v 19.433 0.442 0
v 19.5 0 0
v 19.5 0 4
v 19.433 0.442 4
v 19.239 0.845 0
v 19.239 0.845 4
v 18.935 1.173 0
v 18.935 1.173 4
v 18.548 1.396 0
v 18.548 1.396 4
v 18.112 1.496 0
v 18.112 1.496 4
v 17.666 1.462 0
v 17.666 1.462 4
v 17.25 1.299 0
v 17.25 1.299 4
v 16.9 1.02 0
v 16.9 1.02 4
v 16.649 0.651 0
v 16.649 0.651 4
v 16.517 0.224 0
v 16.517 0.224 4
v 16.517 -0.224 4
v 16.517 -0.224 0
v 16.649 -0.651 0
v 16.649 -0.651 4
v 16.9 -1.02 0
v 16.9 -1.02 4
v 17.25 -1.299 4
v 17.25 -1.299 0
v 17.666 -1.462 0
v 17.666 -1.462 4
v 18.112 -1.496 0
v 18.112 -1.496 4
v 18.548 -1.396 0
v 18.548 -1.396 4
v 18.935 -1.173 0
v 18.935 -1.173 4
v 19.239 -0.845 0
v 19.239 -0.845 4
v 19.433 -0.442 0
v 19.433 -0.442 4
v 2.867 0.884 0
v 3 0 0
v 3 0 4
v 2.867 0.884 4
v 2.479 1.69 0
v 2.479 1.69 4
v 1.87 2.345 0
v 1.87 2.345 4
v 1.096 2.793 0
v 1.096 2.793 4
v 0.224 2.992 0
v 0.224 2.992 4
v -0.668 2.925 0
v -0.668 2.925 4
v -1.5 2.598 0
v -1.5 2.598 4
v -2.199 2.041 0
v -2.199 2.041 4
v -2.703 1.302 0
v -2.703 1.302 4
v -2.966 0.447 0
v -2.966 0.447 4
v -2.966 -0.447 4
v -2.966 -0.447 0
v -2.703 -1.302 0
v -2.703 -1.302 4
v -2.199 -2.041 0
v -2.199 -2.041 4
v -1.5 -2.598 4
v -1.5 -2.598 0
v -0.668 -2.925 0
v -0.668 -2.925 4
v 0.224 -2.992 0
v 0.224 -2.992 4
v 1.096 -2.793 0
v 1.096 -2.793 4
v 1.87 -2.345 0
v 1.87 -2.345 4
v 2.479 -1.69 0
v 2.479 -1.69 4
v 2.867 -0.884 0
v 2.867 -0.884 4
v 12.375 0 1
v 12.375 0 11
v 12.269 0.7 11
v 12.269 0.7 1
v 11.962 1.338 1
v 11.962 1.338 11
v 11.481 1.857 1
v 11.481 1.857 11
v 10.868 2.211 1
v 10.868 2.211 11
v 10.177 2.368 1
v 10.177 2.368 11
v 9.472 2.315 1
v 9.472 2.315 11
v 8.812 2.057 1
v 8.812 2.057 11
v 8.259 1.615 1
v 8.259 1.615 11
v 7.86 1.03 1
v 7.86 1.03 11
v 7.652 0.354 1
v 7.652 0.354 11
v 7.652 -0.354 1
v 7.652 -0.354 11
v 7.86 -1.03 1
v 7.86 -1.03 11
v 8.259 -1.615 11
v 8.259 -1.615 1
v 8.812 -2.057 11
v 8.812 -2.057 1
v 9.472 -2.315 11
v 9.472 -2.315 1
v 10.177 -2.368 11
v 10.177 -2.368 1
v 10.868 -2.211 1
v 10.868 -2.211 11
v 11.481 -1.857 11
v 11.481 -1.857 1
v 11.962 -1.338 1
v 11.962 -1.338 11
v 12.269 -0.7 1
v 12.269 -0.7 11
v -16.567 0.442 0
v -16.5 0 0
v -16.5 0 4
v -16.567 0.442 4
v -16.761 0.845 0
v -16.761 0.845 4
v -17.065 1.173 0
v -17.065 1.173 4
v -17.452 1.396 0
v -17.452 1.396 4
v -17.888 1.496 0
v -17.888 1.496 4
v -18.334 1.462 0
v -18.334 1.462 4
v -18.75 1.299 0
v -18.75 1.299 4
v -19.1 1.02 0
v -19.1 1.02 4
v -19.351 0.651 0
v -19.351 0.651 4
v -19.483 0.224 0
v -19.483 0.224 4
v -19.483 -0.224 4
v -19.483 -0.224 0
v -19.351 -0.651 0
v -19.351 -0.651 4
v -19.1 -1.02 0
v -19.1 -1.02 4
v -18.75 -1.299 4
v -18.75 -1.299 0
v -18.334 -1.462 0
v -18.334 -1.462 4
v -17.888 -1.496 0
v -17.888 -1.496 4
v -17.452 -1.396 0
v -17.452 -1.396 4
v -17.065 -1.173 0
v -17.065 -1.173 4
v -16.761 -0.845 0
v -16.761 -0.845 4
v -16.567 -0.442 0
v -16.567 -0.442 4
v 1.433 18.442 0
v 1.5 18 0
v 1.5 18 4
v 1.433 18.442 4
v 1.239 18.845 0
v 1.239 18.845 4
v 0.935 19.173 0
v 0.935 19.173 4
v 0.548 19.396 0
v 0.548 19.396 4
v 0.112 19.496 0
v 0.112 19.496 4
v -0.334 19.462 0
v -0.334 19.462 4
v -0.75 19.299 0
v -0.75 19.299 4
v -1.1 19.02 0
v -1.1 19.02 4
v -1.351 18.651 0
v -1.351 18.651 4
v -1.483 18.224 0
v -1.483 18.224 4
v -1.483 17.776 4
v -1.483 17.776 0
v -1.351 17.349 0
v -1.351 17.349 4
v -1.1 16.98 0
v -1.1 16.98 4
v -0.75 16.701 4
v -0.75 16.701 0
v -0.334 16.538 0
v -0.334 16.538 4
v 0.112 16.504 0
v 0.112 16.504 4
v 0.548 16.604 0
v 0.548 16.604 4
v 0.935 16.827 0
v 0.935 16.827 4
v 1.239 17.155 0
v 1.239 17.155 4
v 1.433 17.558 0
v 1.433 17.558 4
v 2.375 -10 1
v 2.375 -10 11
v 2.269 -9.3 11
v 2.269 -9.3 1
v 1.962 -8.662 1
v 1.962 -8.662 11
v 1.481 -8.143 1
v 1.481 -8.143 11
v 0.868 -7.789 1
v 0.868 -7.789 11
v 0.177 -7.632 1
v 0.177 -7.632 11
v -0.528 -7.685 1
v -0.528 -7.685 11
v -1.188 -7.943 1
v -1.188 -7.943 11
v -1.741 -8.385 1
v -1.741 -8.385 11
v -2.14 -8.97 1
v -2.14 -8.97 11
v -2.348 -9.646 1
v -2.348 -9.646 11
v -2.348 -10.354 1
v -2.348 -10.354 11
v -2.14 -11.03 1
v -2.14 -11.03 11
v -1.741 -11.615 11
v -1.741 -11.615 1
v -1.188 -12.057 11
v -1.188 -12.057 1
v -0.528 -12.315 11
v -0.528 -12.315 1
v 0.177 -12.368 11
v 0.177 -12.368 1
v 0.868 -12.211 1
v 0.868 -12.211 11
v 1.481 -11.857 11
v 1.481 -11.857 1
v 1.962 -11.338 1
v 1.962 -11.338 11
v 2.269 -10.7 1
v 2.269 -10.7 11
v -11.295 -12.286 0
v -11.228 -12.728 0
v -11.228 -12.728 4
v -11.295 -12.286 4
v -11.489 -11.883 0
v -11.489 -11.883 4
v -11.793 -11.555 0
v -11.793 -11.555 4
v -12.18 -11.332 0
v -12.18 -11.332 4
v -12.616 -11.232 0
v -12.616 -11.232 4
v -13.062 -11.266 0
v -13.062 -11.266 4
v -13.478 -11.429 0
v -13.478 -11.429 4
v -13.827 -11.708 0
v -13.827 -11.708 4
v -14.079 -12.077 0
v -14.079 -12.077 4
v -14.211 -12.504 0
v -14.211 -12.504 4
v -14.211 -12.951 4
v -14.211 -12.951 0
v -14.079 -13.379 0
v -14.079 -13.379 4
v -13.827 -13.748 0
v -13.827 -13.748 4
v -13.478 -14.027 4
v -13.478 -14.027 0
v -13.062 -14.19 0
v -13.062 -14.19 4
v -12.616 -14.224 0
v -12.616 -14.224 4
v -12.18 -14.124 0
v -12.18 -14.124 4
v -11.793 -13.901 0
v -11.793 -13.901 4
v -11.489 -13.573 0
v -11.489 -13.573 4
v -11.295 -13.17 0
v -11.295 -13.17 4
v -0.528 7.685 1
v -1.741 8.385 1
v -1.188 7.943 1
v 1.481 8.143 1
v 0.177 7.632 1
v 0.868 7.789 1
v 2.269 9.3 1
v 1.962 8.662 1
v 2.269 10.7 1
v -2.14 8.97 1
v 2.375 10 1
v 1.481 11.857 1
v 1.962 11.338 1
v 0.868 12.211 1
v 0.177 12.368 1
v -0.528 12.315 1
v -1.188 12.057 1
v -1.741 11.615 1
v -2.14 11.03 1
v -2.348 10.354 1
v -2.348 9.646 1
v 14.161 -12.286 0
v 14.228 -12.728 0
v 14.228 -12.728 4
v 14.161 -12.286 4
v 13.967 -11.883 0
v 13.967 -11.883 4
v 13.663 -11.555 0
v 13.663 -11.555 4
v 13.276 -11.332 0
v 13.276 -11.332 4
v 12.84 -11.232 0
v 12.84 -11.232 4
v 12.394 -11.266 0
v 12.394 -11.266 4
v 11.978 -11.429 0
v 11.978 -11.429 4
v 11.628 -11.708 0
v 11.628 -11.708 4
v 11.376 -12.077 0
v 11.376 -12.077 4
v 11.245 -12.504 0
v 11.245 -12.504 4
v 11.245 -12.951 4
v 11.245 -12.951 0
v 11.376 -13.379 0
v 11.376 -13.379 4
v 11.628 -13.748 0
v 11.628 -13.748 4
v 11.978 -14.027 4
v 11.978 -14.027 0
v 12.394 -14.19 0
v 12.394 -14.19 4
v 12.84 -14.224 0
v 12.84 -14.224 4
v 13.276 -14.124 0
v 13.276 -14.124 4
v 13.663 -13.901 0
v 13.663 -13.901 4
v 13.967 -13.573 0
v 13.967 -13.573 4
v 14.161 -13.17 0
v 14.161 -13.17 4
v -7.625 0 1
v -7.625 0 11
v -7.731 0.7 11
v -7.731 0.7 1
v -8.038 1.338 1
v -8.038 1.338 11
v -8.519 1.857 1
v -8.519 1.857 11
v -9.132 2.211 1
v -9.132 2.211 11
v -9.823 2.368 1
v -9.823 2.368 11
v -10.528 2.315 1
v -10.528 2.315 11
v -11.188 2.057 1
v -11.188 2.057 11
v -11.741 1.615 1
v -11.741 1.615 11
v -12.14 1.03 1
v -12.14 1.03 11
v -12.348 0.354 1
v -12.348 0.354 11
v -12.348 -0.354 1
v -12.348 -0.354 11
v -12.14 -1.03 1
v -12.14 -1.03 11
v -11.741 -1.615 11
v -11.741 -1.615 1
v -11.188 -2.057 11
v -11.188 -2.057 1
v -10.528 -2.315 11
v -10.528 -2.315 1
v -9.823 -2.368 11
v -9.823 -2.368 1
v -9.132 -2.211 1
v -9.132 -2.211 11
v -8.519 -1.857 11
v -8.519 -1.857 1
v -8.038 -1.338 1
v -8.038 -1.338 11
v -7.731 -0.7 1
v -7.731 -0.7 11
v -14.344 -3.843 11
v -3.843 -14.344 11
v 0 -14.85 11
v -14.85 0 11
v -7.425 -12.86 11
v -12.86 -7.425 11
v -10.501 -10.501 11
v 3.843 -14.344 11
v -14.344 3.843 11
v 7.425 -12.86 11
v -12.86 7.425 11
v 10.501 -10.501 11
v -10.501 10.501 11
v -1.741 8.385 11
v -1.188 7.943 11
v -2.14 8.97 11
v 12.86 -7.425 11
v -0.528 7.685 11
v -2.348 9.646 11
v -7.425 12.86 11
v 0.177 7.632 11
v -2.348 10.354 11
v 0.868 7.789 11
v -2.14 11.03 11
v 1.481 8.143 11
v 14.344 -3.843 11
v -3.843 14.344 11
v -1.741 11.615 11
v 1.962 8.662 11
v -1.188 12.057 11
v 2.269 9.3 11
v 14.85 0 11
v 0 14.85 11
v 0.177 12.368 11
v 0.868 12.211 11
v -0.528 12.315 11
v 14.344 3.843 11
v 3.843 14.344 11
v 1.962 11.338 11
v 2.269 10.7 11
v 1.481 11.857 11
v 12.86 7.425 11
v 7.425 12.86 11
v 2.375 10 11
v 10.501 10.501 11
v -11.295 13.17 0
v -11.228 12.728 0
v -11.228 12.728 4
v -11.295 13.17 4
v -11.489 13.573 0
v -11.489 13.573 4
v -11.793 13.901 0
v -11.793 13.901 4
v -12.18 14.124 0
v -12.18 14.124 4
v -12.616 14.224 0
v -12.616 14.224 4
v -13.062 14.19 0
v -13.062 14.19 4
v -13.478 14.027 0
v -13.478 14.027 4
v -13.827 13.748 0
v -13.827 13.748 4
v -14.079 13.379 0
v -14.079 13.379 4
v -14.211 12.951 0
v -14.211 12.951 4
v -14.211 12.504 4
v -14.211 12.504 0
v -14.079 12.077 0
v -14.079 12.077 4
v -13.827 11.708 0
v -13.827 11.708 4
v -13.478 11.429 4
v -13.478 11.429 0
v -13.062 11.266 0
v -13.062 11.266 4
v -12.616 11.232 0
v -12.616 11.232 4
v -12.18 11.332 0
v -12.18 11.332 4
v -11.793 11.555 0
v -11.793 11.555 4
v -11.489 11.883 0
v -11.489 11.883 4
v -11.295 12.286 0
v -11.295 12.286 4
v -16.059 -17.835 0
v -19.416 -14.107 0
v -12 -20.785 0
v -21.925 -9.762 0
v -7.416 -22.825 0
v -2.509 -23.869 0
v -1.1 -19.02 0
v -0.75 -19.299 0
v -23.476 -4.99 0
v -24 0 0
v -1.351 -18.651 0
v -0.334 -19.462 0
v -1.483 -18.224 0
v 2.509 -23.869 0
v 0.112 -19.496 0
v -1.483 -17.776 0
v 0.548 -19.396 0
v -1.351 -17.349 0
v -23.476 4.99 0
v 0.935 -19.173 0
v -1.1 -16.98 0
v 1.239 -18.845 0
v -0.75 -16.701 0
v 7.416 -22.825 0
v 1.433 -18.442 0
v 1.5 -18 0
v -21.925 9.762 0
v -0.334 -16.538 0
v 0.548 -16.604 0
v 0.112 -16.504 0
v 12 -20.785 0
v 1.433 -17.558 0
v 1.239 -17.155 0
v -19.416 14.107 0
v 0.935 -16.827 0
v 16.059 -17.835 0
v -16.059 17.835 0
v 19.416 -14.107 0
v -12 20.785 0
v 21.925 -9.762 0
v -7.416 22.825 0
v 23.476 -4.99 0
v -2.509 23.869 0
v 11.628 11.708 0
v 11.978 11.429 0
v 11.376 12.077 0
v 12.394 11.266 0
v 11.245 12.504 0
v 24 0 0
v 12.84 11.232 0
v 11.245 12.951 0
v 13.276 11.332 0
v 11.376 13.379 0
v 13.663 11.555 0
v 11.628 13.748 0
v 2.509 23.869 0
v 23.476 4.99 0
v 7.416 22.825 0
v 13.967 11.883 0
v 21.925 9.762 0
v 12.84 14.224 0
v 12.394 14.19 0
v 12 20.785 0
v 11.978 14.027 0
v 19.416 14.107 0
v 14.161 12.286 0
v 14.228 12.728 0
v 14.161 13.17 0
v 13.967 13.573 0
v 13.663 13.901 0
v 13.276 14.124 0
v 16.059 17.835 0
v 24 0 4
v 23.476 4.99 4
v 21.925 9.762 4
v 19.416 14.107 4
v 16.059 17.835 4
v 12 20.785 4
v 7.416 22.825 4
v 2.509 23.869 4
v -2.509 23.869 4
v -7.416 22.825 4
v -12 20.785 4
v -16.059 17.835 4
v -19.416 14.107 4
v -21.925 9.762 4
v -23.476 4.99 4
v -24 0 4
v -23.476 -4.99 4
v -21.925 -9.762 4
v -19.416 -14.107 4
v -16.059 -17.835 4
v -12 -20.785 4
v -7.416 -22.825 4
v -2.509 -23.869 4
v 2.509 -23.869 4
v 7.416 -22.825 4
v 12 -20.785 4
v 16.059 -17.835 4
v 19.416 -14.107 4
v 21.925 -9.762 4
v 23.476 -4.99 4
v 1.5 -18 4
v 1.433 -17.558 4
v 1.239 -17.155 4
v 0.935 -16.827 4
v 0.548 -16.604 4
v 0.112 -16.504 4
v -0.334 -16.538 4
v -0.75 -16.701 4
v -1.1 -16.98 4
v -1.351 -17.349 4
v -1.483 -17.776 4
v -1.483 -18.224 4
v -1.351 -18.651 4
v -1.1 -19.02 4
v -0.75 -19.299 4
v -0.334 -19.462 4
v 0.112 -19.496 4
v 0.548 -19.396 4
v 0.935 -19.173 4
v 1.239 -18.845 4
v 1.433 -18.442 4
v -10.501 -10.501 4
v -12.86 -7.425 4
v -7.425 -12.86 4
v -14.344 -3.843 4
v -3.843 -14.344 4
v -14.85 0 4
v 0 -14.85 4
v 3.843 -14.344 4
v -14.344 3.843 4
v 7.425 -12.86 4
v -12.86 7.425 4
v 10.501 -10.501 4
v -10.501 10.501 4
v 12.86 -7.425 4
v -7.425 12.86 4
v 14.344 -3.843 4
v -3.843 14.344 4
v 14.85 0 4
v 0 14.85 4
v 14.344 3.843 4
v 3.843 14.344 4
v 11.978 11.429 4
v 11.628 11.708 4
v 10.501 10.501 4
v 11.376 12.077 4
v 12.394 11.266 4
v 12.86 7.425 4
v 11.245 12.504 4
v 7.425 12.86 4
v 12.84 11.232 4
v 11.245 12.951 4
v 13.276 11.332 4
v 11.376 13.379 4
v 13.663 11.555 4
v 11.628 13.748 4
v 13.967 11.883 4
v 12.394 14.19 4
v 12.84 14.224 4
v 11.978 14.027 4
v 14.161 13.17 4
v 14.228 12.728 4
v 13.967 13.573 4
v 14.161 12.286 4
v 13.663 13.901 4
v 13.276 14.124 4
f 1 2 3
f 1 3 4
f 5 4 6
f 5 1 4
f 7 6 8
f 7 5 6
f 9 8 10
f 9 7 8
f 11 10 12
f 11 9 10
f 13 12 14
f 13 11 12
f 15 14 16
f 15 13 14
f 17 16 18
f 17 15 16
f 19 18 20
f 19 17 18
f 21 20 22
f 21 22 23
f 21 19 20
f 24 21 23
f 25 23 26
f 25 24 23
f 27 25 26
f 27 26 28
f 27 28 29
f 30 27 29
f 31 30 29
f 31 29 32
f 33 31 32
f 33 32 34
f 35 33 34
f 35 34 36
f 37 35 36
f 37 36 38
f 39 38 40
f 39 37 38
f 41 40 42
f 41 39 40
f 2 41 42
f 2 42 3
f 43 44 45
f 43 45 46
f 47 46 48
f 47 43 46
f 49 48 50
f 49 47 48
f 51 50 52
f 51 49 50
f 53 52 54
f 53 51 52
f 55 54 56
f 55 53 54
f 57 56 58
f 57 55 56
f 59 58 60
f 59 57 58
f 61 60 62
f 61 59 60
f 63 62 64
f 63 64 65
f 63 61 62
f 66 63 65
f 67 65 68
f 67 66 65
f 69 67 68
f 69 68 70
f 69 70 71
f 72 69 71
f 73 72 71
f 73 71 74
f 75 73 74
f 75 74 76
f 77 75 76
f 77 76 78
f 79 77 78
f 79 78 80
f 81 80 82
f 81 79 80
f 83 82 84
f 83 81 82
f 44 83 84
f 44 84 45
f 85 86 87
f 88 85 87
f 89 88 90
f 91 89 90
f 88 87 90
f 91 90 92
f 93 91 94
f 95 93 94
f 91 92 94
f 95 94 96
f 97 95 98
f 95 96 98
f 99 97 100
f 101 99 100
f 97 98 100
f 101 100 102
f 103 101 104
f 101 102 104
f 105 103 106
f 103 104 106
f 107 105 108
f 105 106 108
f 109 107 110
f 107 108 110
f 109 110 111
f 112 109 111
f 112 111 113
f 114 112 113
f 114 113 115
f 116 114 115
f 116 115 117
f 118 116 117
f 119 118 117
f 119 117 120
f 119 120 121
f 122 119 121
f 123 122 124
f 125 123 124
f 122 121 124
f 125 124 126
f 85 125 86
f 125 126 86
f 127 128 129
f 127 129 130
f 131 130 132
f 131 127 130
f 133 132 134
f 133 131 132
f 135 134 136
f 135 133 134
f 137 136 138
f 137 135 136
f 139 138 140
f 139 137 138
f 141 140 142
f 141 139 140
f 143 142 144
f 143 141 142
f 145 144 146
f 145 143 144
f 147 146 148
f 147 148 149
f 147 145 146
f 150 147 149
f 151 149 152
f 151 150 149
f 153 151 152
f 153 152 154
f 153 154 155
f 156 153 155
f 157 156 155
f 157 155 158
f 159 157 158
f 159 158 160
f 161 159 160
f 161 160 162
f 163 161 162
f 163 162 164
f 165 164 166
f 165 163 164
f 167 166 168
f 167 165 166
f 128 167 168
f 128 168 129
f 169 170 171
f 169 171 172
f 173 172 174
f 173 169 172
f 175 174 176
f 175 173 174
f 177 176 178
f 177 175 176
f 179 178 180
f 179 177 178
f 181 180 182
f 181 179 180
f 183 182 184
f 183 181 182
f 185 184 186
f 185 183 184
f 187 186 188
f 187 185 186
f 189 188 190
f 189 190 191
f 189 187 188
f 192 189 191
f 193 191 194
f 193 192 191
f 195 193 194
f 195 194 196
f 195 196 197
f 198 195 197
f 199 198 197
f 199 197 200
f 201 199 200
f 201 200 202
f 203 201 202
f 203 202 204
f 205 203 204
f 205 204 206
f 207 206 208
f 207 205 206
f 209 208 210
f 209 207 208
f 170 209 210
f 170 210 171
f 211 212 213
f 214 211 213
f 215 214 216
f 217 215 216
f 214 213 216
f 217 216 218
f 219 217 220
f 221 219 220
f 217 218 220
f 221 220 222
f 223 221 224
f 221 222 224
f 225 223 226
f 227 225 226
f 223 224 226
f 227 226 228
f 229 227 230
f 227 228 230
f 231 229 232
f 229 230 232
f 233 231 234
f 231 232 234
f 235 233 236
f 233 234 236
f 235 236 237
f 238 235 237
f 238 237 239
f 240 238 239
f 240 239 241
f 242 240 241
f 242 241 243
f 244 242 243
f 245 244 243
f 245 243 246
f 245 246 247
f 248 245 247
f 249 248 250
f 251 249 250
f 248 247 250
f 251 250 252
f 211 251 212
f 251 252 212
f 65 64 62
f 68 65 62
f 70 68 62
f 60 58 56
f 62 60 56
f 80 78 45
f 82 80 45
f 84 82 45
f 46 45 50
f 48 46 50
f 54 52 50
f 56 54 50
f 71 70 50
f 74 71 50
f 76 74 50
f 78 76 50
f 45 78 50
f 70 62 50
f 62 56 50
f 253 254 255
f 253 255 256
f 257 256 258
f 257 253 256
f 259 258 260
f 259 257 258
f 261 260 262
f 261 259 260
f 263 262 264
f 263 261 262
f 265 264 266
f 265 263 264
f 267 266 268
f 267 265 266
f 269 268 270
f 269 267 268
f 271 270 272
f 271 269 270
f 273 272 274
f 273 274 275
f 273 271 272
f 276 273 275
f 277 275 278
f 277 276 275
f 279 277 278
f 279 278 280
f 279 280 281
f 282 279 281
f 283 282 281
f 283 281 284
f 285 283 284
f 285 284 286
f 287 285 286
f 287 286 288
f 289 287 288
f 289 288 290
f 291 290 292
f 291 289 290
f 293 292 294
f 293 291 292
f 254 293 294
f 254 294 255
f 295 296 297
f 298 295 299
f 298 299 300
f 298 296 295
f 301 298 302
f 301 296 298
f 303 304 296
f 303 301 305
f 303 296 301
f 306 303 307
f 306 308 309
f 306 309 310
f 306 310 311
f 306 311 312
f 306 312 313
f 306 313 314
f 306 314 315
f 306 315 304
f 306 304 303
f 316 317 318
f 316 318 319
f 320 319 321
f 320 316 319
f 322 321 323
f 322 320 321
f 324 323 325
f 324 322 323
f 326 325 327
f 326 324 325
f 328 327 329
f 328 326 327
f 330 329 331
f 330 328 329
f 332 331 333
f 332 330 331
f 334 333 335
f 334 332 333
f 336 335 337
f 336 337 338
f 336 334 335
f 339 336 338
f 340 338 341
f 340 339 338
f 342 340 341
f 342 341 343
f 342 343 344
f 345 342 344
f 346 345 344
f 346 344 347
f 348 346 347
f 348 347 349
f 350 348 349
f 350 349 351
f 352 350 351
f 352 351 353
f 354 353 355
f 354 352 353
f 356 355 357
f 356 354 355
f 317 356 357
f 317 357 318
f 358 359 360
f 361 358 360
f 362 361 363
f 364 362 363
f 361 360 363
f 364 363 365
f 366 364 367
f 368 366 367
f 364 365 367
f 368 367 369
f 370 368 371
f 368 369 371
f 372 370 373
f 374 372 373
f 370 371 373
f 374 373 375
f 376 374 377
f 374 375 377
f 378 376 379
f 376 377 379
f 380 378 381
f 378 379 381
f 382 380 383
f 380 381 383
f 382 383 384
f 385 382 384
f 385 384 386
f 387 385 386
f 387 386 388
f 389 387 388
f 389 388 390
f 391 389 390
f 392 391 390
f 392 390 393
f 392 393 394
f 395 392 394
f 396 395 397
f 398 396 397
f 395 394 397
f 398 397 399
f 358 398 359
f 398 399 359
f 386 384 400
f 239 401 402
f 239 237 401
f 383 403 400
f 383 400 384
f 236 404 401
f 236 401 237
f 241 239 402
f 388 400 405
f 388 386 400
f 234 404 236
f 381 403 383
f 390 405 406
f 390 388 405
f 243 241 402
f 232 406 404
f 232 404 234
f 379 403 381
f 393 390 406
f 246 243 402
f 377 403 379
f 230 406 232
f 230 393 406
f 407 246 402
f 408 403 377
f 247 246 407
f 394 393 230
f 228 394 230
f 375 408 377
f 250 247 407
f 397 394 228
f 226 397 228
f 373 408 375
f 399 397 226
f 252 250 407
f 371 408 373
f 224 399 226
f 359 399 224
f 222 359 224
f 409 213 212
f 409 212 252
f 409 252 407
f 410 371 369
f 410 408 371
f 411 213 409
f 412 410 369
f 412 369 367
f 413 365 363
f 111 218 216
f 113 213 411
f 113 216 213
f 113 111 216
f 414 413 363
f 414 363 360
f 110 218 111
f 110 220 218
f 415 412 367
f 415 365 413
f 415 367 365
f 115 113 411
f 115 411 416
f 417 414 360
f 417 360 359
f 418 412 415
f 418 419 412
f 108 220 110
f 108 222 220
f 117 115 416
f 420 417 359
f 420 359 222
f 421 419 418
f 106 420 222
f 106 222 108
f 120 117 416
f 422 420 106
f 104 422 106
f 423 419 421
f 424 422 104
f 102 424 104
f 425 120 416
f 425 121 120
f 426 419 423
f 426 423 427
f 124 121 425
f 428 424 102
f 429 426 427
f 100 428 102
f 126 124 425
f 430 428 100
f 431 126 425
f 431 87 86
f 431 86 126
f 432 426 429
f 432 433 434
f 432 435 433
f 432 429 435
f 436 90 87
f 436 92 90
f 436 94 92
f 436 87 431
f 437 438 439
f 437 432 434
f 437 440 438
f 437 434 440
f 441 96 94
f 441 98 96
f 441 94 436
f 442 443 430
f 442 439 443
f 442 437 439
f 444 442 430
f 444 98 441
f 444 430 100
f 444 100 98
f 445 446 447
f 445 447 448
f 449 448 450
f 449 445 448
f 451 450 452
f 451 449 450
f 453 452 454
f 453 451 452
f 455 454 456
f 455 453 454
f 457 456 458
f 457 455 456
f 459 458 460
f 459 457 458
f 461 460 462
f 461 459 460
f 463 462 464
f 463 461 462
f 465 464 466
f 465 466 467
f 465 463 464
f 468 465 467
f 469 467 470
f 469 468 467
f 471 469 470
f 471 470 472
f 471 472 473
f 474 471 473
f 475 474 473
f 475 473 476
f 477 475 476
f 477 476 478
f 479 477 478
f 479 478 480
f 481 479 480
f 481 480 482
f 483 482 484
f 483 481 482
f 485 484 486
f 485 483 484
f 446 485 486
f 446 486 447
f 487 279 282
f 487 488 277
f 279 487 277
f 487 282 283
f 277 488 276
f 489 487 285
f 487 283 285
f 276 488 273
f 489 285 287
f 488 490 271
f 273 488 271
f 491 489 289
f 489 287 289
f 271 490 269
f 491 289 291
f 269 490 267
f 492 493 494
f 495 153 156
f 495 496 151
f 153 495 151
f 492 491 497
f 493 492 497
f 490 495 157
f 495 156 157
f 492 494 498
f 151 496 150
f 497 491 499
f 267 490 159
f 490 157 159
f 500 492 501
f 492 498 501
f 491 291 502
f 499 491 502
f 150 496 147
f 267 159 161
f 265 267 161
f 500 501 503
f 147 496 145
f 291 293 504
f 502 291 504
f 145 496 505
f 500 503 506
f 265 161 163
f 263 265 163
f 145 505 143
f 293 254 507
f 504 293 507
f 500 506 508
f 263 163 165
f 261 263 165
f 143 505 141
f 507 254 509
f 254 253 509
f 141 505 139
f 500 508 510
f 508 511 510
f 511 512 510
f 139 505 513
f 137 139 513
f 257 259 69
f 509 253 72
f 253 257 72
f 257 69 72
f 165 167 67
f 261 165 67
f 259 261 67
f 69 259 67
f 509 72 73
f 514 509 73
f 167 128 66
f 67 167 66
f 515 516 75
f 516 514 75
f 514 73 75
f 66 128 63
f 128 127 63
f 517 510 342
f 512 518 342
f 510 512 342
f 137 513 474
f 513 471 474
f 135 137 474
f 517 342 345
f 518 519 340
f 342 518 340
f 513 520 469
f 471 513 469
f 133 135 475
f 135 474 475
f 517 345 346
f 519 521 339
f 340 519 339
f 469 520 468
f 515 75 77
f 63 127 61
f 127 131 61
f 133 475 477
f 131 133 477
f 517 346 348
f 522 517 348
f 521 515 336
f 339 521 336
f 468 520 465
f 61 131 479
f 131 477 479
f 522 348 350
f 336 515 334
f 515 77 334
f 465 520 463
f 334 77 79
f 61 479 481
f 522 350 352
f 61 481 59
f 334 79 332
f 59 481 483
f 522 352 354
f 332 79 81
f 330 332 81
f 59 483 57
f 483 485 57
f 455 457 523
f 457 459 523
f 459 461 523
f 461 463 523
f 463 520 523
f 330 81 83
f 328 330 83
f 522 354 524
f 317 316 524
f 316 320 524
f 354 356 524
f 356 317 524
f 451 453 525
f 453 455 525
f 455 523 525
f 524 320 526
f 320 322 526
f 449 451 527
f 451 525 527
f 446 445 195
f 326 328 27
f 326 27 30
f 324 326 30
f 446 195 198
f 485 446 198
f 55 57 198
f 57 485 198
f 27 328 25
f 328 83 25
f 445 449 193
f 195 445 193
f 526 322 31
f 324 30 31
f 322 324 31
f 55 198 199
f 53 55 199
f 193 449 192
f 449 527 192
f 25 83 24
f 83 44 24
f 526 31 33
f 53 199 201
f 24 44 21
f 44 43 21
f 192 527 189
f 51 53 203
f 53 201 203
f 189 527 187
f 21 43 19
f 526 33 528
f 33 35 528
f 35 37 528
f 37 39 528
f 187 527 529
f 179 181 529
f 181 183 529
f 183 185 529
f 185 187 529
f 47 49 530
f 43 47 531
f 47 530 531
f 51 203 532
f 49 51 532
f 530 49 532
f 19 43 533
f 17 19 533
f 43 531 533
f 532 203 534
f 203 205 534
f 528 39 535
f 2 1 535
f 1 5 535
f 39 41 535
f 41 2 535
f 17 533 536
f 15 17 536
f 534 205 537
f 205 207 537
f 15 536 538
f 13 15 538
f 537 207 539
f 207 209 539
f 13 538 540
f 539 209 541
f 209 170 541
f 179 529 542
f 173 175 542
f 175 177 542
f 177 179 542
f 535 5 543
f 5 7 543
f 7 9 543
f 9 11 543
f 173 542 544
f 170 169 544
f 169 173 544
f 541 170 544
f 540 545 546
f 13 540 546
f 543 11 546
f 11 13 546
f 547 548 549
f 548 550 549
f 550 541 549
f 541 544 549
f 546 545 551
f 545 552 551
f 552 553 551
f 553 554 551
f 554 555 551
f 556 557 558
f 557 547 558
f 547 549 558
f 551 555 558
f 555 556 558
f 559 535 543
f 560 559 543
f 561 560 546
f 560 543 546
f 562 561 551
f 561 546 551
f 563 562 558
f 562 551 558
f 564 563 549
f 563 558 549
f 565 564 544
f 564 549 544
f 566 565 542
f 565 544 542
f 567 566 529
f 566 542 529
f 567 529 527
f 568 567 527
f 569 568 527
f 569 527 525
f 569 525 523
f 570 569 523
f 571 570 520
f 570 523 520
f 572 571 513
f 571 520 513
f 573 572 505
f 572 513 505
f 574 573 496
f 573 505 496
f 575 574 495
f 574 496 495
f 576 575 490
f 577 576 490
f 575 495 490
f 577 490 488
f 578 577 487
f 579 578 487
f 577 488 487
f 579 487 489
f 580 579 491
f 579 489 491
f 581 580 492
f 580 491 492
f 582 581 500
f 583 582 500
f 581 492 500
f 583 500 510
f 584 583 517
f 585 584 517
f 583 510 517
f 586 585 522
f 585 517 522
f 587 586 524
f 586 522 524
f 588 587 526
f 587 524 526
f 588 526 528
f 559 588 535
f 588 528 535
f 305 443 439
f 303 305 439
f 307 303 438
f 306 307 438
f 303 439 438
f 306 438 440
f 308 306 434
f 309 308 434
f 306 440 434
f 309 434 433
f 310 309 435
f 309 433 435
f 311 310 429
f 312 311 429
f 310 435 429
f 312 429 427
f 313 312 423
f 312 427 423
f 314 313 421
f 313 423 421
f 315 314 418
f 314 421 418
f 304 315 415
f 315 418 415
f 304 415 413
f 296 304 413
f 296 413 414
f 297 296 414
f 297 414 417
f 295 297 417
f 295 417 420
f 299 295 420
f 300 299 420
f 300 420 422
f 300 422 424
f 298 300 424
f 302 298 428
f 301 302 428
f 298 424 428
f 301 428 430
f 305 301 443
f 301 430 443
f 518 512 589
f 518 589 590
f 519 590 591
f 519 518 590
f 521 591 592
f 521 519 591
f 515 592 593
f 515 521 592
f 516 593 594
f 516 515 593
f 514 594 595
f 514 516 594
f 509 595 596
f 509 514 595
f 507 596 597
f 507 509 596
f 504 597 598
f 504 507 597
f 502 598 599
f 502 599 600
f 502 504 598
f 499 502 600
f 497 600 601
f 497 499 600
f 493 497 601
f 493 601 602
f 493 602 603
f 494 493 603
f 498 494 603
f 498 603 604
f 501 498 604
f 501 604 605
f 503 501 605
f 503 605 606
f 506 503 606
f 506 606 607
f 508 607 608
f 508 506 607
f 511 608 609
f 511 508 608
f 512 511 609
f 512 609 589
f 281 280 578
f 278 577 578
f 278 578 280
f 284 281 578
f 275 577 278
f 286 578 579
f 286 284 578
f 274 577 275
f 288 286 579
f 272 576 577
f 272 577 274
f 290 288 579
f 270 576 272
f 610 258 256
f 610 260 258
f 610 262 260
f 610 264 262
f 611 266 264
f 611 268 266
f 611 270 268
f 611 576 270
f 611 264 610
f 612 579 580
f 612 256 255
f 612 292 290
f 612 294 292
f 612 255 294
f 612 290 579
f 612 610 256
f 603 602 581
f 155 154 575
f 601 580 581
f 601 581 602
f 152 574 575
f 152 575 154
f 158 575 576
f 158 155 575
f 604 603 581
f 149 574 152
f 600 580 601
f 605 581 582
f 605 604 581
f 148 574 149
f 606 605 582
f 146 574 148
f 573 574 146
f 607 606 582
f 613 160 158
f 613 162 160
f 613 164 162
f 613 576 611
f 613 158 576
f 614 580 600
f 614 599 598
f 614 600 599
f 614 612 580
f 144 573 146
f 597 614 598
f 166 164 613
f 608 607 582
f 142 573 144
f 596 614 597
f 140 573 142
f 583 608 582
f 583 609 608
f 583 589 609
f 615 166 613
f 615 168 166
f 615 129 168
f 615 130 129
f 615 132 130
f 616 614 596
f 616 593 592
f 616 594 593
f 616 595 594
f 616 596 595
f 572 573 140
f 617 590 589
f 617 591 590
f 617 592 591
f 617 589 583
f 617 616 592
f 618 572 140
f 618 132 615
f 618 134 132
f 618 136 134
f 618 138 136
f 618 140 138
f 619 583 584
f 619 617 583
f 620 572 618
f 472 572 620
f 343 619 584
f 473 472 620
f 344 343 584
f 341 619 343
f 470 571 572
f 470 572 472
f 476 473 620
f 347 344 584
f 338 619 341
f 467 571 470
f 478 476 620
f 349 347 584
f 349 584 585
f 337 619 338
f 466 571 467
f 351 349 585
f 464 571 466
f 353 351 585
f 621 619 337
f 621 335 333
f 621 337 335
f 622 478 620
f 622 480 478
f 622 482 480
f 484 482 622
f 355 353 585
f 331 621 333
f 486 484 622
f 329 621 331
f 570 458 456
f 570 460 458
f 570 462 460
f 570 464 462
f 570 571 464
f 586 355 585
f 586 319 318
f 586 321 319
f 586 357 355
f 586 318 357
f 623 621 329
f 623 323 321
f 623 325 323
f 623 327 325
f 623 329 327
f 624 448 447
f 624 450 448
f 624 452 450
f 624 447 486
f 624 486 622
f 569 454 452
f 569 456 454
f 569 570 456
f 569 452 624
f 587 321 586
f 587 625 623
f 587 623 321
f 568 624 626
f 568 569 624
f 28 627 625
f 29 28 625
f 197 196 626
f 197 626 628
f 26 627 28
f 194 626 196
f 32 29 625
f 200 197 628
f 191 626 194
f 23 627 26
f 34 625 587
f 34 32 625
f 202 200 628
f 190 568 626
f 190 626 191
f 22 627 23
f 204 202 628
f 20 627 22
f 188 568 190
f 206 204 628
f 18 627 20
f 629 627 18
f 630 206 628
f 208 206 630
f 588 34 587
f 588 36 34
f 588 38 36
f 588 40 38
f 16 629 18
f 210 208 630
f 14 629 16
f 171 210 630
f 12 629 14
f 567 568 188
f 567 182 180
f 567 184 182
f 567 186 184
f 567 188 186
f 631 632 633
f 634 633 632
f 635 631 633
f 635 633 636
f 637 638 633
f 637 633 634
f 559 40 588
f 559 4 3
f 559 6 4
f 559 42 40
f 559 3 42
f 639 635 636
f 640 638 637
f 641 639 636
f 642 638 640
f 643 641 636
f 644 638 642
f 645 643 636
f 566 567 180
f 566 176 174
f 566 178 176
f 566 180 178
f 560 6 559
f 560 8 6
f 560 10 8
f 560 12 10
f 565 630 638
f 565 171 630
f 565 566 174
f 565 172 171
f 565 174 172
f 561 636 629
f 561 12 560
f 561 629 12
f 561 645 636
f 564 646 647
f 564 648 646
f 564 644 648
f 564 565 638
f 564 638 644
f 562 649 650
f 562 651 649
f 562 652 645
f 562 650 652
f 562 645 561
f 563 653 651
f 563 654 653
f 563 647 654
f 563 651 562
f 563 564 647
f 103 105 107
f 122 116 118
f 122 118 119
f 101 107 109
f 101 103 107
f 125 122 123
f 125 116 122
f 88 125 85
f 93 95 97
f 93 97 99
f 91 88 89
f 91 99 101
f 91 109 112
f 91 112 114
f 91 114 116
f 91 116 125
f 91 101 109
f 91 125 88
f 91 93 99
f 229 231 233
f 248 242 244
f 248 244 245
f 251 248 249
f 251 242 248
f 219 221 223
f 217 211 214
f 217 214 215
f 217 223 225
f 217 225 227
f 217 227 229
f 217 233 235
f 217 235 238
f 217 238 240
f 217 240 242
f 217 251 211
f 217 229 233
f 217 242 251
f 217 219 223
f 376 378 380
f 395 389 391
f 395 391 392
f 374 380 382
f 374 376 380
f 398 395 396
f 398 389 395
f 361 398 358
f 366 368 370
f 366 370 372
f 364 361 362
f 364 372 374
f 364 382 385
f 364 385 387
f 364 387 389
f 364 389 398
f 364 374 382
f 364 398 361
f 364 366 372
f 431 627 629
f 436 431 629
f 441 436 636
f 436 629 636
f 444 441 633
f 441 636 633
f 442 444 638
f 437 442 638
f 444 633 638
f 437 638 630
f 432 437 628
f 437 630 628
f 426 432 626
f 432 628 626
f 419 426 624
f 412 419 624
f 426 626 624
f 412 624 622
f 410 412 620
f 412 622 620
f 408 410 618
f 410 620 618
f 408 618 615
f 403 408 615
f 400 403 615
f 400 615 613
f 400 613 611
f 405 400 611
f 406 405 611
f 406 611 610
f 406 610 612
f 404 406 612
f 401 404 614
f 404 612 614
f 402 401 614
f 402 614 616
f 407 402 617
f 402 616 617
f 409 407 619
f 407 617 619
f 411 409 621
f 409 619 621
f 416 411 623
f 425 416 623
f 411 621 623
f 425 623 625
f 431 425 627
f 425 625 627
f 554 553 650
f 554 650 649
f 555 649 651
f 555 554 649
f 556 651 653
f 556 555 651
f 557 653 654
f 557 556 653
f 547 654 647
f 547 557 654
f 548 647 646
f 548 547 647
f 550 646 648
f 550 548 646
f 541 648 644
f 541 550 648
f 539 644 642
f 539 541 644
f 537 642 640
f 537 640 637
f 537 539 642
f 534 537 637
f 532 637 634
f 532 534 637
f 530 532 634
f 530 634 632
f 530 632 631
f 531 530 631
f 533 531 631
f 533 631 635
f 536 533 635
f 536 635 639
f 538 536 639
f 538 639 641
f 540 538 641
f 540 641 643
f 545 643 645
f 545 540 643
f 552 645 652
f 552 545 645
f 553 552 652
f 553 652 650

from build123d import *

# Parameters (mm, degrees)
ESQUISSE1_R             = 24
ESQUISSE1_R_2           = 1.5
ESQUISSE1_R_3           = 3
BOSS_EXTRU_1_DEPTH      = 4
ESQUISSE2_R             = 14.85
BOSS_EXTRU_2_DEPTH      = 7
ESQUISSE3_R             = 2.375
ENL_V_MAT_EXTRU_1_DEPTH = 10


with BuildPart() as part:
    # Esquisse1 → Boss.-Extru.1 (new body)
    with BuildSketch(Plane.XY):
        Circle(ESQUISSE1_R)
        with Locations((0, 18)):
            Circle(ESQUISSE1_R_2, mode=Mode.SUBTRACT)
        with Locations((12.727922061, 12.727922061)):
            Circle(ESQUISSE1_R_2, mode=Mode.SUBTRACT)
        with Locations((18, 0)):
            Circle(ESQUISSE1_R_2, mode=Mode.SUBTRACT)
        with Locations((12.727922061, -12.727922061)):
            Circle(ESQUISSE1_R_2, mode=Mode.SUBTRACT)
        with Locations((0, -18)):
            Circle(ESQUISSE1_R_2, mode=Mode.SUBTRACT)
        with Locations((-12.727922061, -12.727922061)):
            Circle(ESQUISSE1_R_2, mode=Mode.SUBTRACT)
        with Locations((-18, 0)):
            Circle(ESQUISSE1_R_2, mode=Mode.SUBTRACT)
        with Locations((-12.727922061, 12.727922061)):
            Circle(ESQUISSE1_R_2, mode=Mode.SUBTRACT)
        Circle(ESQUISSE1_R_3, mode=Mode.SUBTRACT)
    extrude(amount=BOSS_EXTRU_1_DEPTH)

    # Esquisse2 → Boss.-Extru.2 (add)
    with BuildSketch(Plane.XY.offset(4)):
        Circle(ESQUISSE2_R)
    extrude(amount=BOSS_EXTRU_2_DEPTH)

    # Esquisse3 → Enlèv. mat.-Extru.1 (cut)
    with BuildSketch(Plane.XY.offset(11)):
        with Locations((0, 10)):
            Circle(ESQUISSE3_R)
        with Locations((10, 0)):
            Circle(ESQUISSE3_R)
        with Locations((0, -10)):
            Circle(ESQUISSE3_R)
        with Locations((-10, 0)):
            Circle(ESQUISSE3_R)
    extrude(amount=-ENL_V_MAT_EXTRU_1_DEPTH, mode=Mode.SUBTRACT)


solid = part.part
